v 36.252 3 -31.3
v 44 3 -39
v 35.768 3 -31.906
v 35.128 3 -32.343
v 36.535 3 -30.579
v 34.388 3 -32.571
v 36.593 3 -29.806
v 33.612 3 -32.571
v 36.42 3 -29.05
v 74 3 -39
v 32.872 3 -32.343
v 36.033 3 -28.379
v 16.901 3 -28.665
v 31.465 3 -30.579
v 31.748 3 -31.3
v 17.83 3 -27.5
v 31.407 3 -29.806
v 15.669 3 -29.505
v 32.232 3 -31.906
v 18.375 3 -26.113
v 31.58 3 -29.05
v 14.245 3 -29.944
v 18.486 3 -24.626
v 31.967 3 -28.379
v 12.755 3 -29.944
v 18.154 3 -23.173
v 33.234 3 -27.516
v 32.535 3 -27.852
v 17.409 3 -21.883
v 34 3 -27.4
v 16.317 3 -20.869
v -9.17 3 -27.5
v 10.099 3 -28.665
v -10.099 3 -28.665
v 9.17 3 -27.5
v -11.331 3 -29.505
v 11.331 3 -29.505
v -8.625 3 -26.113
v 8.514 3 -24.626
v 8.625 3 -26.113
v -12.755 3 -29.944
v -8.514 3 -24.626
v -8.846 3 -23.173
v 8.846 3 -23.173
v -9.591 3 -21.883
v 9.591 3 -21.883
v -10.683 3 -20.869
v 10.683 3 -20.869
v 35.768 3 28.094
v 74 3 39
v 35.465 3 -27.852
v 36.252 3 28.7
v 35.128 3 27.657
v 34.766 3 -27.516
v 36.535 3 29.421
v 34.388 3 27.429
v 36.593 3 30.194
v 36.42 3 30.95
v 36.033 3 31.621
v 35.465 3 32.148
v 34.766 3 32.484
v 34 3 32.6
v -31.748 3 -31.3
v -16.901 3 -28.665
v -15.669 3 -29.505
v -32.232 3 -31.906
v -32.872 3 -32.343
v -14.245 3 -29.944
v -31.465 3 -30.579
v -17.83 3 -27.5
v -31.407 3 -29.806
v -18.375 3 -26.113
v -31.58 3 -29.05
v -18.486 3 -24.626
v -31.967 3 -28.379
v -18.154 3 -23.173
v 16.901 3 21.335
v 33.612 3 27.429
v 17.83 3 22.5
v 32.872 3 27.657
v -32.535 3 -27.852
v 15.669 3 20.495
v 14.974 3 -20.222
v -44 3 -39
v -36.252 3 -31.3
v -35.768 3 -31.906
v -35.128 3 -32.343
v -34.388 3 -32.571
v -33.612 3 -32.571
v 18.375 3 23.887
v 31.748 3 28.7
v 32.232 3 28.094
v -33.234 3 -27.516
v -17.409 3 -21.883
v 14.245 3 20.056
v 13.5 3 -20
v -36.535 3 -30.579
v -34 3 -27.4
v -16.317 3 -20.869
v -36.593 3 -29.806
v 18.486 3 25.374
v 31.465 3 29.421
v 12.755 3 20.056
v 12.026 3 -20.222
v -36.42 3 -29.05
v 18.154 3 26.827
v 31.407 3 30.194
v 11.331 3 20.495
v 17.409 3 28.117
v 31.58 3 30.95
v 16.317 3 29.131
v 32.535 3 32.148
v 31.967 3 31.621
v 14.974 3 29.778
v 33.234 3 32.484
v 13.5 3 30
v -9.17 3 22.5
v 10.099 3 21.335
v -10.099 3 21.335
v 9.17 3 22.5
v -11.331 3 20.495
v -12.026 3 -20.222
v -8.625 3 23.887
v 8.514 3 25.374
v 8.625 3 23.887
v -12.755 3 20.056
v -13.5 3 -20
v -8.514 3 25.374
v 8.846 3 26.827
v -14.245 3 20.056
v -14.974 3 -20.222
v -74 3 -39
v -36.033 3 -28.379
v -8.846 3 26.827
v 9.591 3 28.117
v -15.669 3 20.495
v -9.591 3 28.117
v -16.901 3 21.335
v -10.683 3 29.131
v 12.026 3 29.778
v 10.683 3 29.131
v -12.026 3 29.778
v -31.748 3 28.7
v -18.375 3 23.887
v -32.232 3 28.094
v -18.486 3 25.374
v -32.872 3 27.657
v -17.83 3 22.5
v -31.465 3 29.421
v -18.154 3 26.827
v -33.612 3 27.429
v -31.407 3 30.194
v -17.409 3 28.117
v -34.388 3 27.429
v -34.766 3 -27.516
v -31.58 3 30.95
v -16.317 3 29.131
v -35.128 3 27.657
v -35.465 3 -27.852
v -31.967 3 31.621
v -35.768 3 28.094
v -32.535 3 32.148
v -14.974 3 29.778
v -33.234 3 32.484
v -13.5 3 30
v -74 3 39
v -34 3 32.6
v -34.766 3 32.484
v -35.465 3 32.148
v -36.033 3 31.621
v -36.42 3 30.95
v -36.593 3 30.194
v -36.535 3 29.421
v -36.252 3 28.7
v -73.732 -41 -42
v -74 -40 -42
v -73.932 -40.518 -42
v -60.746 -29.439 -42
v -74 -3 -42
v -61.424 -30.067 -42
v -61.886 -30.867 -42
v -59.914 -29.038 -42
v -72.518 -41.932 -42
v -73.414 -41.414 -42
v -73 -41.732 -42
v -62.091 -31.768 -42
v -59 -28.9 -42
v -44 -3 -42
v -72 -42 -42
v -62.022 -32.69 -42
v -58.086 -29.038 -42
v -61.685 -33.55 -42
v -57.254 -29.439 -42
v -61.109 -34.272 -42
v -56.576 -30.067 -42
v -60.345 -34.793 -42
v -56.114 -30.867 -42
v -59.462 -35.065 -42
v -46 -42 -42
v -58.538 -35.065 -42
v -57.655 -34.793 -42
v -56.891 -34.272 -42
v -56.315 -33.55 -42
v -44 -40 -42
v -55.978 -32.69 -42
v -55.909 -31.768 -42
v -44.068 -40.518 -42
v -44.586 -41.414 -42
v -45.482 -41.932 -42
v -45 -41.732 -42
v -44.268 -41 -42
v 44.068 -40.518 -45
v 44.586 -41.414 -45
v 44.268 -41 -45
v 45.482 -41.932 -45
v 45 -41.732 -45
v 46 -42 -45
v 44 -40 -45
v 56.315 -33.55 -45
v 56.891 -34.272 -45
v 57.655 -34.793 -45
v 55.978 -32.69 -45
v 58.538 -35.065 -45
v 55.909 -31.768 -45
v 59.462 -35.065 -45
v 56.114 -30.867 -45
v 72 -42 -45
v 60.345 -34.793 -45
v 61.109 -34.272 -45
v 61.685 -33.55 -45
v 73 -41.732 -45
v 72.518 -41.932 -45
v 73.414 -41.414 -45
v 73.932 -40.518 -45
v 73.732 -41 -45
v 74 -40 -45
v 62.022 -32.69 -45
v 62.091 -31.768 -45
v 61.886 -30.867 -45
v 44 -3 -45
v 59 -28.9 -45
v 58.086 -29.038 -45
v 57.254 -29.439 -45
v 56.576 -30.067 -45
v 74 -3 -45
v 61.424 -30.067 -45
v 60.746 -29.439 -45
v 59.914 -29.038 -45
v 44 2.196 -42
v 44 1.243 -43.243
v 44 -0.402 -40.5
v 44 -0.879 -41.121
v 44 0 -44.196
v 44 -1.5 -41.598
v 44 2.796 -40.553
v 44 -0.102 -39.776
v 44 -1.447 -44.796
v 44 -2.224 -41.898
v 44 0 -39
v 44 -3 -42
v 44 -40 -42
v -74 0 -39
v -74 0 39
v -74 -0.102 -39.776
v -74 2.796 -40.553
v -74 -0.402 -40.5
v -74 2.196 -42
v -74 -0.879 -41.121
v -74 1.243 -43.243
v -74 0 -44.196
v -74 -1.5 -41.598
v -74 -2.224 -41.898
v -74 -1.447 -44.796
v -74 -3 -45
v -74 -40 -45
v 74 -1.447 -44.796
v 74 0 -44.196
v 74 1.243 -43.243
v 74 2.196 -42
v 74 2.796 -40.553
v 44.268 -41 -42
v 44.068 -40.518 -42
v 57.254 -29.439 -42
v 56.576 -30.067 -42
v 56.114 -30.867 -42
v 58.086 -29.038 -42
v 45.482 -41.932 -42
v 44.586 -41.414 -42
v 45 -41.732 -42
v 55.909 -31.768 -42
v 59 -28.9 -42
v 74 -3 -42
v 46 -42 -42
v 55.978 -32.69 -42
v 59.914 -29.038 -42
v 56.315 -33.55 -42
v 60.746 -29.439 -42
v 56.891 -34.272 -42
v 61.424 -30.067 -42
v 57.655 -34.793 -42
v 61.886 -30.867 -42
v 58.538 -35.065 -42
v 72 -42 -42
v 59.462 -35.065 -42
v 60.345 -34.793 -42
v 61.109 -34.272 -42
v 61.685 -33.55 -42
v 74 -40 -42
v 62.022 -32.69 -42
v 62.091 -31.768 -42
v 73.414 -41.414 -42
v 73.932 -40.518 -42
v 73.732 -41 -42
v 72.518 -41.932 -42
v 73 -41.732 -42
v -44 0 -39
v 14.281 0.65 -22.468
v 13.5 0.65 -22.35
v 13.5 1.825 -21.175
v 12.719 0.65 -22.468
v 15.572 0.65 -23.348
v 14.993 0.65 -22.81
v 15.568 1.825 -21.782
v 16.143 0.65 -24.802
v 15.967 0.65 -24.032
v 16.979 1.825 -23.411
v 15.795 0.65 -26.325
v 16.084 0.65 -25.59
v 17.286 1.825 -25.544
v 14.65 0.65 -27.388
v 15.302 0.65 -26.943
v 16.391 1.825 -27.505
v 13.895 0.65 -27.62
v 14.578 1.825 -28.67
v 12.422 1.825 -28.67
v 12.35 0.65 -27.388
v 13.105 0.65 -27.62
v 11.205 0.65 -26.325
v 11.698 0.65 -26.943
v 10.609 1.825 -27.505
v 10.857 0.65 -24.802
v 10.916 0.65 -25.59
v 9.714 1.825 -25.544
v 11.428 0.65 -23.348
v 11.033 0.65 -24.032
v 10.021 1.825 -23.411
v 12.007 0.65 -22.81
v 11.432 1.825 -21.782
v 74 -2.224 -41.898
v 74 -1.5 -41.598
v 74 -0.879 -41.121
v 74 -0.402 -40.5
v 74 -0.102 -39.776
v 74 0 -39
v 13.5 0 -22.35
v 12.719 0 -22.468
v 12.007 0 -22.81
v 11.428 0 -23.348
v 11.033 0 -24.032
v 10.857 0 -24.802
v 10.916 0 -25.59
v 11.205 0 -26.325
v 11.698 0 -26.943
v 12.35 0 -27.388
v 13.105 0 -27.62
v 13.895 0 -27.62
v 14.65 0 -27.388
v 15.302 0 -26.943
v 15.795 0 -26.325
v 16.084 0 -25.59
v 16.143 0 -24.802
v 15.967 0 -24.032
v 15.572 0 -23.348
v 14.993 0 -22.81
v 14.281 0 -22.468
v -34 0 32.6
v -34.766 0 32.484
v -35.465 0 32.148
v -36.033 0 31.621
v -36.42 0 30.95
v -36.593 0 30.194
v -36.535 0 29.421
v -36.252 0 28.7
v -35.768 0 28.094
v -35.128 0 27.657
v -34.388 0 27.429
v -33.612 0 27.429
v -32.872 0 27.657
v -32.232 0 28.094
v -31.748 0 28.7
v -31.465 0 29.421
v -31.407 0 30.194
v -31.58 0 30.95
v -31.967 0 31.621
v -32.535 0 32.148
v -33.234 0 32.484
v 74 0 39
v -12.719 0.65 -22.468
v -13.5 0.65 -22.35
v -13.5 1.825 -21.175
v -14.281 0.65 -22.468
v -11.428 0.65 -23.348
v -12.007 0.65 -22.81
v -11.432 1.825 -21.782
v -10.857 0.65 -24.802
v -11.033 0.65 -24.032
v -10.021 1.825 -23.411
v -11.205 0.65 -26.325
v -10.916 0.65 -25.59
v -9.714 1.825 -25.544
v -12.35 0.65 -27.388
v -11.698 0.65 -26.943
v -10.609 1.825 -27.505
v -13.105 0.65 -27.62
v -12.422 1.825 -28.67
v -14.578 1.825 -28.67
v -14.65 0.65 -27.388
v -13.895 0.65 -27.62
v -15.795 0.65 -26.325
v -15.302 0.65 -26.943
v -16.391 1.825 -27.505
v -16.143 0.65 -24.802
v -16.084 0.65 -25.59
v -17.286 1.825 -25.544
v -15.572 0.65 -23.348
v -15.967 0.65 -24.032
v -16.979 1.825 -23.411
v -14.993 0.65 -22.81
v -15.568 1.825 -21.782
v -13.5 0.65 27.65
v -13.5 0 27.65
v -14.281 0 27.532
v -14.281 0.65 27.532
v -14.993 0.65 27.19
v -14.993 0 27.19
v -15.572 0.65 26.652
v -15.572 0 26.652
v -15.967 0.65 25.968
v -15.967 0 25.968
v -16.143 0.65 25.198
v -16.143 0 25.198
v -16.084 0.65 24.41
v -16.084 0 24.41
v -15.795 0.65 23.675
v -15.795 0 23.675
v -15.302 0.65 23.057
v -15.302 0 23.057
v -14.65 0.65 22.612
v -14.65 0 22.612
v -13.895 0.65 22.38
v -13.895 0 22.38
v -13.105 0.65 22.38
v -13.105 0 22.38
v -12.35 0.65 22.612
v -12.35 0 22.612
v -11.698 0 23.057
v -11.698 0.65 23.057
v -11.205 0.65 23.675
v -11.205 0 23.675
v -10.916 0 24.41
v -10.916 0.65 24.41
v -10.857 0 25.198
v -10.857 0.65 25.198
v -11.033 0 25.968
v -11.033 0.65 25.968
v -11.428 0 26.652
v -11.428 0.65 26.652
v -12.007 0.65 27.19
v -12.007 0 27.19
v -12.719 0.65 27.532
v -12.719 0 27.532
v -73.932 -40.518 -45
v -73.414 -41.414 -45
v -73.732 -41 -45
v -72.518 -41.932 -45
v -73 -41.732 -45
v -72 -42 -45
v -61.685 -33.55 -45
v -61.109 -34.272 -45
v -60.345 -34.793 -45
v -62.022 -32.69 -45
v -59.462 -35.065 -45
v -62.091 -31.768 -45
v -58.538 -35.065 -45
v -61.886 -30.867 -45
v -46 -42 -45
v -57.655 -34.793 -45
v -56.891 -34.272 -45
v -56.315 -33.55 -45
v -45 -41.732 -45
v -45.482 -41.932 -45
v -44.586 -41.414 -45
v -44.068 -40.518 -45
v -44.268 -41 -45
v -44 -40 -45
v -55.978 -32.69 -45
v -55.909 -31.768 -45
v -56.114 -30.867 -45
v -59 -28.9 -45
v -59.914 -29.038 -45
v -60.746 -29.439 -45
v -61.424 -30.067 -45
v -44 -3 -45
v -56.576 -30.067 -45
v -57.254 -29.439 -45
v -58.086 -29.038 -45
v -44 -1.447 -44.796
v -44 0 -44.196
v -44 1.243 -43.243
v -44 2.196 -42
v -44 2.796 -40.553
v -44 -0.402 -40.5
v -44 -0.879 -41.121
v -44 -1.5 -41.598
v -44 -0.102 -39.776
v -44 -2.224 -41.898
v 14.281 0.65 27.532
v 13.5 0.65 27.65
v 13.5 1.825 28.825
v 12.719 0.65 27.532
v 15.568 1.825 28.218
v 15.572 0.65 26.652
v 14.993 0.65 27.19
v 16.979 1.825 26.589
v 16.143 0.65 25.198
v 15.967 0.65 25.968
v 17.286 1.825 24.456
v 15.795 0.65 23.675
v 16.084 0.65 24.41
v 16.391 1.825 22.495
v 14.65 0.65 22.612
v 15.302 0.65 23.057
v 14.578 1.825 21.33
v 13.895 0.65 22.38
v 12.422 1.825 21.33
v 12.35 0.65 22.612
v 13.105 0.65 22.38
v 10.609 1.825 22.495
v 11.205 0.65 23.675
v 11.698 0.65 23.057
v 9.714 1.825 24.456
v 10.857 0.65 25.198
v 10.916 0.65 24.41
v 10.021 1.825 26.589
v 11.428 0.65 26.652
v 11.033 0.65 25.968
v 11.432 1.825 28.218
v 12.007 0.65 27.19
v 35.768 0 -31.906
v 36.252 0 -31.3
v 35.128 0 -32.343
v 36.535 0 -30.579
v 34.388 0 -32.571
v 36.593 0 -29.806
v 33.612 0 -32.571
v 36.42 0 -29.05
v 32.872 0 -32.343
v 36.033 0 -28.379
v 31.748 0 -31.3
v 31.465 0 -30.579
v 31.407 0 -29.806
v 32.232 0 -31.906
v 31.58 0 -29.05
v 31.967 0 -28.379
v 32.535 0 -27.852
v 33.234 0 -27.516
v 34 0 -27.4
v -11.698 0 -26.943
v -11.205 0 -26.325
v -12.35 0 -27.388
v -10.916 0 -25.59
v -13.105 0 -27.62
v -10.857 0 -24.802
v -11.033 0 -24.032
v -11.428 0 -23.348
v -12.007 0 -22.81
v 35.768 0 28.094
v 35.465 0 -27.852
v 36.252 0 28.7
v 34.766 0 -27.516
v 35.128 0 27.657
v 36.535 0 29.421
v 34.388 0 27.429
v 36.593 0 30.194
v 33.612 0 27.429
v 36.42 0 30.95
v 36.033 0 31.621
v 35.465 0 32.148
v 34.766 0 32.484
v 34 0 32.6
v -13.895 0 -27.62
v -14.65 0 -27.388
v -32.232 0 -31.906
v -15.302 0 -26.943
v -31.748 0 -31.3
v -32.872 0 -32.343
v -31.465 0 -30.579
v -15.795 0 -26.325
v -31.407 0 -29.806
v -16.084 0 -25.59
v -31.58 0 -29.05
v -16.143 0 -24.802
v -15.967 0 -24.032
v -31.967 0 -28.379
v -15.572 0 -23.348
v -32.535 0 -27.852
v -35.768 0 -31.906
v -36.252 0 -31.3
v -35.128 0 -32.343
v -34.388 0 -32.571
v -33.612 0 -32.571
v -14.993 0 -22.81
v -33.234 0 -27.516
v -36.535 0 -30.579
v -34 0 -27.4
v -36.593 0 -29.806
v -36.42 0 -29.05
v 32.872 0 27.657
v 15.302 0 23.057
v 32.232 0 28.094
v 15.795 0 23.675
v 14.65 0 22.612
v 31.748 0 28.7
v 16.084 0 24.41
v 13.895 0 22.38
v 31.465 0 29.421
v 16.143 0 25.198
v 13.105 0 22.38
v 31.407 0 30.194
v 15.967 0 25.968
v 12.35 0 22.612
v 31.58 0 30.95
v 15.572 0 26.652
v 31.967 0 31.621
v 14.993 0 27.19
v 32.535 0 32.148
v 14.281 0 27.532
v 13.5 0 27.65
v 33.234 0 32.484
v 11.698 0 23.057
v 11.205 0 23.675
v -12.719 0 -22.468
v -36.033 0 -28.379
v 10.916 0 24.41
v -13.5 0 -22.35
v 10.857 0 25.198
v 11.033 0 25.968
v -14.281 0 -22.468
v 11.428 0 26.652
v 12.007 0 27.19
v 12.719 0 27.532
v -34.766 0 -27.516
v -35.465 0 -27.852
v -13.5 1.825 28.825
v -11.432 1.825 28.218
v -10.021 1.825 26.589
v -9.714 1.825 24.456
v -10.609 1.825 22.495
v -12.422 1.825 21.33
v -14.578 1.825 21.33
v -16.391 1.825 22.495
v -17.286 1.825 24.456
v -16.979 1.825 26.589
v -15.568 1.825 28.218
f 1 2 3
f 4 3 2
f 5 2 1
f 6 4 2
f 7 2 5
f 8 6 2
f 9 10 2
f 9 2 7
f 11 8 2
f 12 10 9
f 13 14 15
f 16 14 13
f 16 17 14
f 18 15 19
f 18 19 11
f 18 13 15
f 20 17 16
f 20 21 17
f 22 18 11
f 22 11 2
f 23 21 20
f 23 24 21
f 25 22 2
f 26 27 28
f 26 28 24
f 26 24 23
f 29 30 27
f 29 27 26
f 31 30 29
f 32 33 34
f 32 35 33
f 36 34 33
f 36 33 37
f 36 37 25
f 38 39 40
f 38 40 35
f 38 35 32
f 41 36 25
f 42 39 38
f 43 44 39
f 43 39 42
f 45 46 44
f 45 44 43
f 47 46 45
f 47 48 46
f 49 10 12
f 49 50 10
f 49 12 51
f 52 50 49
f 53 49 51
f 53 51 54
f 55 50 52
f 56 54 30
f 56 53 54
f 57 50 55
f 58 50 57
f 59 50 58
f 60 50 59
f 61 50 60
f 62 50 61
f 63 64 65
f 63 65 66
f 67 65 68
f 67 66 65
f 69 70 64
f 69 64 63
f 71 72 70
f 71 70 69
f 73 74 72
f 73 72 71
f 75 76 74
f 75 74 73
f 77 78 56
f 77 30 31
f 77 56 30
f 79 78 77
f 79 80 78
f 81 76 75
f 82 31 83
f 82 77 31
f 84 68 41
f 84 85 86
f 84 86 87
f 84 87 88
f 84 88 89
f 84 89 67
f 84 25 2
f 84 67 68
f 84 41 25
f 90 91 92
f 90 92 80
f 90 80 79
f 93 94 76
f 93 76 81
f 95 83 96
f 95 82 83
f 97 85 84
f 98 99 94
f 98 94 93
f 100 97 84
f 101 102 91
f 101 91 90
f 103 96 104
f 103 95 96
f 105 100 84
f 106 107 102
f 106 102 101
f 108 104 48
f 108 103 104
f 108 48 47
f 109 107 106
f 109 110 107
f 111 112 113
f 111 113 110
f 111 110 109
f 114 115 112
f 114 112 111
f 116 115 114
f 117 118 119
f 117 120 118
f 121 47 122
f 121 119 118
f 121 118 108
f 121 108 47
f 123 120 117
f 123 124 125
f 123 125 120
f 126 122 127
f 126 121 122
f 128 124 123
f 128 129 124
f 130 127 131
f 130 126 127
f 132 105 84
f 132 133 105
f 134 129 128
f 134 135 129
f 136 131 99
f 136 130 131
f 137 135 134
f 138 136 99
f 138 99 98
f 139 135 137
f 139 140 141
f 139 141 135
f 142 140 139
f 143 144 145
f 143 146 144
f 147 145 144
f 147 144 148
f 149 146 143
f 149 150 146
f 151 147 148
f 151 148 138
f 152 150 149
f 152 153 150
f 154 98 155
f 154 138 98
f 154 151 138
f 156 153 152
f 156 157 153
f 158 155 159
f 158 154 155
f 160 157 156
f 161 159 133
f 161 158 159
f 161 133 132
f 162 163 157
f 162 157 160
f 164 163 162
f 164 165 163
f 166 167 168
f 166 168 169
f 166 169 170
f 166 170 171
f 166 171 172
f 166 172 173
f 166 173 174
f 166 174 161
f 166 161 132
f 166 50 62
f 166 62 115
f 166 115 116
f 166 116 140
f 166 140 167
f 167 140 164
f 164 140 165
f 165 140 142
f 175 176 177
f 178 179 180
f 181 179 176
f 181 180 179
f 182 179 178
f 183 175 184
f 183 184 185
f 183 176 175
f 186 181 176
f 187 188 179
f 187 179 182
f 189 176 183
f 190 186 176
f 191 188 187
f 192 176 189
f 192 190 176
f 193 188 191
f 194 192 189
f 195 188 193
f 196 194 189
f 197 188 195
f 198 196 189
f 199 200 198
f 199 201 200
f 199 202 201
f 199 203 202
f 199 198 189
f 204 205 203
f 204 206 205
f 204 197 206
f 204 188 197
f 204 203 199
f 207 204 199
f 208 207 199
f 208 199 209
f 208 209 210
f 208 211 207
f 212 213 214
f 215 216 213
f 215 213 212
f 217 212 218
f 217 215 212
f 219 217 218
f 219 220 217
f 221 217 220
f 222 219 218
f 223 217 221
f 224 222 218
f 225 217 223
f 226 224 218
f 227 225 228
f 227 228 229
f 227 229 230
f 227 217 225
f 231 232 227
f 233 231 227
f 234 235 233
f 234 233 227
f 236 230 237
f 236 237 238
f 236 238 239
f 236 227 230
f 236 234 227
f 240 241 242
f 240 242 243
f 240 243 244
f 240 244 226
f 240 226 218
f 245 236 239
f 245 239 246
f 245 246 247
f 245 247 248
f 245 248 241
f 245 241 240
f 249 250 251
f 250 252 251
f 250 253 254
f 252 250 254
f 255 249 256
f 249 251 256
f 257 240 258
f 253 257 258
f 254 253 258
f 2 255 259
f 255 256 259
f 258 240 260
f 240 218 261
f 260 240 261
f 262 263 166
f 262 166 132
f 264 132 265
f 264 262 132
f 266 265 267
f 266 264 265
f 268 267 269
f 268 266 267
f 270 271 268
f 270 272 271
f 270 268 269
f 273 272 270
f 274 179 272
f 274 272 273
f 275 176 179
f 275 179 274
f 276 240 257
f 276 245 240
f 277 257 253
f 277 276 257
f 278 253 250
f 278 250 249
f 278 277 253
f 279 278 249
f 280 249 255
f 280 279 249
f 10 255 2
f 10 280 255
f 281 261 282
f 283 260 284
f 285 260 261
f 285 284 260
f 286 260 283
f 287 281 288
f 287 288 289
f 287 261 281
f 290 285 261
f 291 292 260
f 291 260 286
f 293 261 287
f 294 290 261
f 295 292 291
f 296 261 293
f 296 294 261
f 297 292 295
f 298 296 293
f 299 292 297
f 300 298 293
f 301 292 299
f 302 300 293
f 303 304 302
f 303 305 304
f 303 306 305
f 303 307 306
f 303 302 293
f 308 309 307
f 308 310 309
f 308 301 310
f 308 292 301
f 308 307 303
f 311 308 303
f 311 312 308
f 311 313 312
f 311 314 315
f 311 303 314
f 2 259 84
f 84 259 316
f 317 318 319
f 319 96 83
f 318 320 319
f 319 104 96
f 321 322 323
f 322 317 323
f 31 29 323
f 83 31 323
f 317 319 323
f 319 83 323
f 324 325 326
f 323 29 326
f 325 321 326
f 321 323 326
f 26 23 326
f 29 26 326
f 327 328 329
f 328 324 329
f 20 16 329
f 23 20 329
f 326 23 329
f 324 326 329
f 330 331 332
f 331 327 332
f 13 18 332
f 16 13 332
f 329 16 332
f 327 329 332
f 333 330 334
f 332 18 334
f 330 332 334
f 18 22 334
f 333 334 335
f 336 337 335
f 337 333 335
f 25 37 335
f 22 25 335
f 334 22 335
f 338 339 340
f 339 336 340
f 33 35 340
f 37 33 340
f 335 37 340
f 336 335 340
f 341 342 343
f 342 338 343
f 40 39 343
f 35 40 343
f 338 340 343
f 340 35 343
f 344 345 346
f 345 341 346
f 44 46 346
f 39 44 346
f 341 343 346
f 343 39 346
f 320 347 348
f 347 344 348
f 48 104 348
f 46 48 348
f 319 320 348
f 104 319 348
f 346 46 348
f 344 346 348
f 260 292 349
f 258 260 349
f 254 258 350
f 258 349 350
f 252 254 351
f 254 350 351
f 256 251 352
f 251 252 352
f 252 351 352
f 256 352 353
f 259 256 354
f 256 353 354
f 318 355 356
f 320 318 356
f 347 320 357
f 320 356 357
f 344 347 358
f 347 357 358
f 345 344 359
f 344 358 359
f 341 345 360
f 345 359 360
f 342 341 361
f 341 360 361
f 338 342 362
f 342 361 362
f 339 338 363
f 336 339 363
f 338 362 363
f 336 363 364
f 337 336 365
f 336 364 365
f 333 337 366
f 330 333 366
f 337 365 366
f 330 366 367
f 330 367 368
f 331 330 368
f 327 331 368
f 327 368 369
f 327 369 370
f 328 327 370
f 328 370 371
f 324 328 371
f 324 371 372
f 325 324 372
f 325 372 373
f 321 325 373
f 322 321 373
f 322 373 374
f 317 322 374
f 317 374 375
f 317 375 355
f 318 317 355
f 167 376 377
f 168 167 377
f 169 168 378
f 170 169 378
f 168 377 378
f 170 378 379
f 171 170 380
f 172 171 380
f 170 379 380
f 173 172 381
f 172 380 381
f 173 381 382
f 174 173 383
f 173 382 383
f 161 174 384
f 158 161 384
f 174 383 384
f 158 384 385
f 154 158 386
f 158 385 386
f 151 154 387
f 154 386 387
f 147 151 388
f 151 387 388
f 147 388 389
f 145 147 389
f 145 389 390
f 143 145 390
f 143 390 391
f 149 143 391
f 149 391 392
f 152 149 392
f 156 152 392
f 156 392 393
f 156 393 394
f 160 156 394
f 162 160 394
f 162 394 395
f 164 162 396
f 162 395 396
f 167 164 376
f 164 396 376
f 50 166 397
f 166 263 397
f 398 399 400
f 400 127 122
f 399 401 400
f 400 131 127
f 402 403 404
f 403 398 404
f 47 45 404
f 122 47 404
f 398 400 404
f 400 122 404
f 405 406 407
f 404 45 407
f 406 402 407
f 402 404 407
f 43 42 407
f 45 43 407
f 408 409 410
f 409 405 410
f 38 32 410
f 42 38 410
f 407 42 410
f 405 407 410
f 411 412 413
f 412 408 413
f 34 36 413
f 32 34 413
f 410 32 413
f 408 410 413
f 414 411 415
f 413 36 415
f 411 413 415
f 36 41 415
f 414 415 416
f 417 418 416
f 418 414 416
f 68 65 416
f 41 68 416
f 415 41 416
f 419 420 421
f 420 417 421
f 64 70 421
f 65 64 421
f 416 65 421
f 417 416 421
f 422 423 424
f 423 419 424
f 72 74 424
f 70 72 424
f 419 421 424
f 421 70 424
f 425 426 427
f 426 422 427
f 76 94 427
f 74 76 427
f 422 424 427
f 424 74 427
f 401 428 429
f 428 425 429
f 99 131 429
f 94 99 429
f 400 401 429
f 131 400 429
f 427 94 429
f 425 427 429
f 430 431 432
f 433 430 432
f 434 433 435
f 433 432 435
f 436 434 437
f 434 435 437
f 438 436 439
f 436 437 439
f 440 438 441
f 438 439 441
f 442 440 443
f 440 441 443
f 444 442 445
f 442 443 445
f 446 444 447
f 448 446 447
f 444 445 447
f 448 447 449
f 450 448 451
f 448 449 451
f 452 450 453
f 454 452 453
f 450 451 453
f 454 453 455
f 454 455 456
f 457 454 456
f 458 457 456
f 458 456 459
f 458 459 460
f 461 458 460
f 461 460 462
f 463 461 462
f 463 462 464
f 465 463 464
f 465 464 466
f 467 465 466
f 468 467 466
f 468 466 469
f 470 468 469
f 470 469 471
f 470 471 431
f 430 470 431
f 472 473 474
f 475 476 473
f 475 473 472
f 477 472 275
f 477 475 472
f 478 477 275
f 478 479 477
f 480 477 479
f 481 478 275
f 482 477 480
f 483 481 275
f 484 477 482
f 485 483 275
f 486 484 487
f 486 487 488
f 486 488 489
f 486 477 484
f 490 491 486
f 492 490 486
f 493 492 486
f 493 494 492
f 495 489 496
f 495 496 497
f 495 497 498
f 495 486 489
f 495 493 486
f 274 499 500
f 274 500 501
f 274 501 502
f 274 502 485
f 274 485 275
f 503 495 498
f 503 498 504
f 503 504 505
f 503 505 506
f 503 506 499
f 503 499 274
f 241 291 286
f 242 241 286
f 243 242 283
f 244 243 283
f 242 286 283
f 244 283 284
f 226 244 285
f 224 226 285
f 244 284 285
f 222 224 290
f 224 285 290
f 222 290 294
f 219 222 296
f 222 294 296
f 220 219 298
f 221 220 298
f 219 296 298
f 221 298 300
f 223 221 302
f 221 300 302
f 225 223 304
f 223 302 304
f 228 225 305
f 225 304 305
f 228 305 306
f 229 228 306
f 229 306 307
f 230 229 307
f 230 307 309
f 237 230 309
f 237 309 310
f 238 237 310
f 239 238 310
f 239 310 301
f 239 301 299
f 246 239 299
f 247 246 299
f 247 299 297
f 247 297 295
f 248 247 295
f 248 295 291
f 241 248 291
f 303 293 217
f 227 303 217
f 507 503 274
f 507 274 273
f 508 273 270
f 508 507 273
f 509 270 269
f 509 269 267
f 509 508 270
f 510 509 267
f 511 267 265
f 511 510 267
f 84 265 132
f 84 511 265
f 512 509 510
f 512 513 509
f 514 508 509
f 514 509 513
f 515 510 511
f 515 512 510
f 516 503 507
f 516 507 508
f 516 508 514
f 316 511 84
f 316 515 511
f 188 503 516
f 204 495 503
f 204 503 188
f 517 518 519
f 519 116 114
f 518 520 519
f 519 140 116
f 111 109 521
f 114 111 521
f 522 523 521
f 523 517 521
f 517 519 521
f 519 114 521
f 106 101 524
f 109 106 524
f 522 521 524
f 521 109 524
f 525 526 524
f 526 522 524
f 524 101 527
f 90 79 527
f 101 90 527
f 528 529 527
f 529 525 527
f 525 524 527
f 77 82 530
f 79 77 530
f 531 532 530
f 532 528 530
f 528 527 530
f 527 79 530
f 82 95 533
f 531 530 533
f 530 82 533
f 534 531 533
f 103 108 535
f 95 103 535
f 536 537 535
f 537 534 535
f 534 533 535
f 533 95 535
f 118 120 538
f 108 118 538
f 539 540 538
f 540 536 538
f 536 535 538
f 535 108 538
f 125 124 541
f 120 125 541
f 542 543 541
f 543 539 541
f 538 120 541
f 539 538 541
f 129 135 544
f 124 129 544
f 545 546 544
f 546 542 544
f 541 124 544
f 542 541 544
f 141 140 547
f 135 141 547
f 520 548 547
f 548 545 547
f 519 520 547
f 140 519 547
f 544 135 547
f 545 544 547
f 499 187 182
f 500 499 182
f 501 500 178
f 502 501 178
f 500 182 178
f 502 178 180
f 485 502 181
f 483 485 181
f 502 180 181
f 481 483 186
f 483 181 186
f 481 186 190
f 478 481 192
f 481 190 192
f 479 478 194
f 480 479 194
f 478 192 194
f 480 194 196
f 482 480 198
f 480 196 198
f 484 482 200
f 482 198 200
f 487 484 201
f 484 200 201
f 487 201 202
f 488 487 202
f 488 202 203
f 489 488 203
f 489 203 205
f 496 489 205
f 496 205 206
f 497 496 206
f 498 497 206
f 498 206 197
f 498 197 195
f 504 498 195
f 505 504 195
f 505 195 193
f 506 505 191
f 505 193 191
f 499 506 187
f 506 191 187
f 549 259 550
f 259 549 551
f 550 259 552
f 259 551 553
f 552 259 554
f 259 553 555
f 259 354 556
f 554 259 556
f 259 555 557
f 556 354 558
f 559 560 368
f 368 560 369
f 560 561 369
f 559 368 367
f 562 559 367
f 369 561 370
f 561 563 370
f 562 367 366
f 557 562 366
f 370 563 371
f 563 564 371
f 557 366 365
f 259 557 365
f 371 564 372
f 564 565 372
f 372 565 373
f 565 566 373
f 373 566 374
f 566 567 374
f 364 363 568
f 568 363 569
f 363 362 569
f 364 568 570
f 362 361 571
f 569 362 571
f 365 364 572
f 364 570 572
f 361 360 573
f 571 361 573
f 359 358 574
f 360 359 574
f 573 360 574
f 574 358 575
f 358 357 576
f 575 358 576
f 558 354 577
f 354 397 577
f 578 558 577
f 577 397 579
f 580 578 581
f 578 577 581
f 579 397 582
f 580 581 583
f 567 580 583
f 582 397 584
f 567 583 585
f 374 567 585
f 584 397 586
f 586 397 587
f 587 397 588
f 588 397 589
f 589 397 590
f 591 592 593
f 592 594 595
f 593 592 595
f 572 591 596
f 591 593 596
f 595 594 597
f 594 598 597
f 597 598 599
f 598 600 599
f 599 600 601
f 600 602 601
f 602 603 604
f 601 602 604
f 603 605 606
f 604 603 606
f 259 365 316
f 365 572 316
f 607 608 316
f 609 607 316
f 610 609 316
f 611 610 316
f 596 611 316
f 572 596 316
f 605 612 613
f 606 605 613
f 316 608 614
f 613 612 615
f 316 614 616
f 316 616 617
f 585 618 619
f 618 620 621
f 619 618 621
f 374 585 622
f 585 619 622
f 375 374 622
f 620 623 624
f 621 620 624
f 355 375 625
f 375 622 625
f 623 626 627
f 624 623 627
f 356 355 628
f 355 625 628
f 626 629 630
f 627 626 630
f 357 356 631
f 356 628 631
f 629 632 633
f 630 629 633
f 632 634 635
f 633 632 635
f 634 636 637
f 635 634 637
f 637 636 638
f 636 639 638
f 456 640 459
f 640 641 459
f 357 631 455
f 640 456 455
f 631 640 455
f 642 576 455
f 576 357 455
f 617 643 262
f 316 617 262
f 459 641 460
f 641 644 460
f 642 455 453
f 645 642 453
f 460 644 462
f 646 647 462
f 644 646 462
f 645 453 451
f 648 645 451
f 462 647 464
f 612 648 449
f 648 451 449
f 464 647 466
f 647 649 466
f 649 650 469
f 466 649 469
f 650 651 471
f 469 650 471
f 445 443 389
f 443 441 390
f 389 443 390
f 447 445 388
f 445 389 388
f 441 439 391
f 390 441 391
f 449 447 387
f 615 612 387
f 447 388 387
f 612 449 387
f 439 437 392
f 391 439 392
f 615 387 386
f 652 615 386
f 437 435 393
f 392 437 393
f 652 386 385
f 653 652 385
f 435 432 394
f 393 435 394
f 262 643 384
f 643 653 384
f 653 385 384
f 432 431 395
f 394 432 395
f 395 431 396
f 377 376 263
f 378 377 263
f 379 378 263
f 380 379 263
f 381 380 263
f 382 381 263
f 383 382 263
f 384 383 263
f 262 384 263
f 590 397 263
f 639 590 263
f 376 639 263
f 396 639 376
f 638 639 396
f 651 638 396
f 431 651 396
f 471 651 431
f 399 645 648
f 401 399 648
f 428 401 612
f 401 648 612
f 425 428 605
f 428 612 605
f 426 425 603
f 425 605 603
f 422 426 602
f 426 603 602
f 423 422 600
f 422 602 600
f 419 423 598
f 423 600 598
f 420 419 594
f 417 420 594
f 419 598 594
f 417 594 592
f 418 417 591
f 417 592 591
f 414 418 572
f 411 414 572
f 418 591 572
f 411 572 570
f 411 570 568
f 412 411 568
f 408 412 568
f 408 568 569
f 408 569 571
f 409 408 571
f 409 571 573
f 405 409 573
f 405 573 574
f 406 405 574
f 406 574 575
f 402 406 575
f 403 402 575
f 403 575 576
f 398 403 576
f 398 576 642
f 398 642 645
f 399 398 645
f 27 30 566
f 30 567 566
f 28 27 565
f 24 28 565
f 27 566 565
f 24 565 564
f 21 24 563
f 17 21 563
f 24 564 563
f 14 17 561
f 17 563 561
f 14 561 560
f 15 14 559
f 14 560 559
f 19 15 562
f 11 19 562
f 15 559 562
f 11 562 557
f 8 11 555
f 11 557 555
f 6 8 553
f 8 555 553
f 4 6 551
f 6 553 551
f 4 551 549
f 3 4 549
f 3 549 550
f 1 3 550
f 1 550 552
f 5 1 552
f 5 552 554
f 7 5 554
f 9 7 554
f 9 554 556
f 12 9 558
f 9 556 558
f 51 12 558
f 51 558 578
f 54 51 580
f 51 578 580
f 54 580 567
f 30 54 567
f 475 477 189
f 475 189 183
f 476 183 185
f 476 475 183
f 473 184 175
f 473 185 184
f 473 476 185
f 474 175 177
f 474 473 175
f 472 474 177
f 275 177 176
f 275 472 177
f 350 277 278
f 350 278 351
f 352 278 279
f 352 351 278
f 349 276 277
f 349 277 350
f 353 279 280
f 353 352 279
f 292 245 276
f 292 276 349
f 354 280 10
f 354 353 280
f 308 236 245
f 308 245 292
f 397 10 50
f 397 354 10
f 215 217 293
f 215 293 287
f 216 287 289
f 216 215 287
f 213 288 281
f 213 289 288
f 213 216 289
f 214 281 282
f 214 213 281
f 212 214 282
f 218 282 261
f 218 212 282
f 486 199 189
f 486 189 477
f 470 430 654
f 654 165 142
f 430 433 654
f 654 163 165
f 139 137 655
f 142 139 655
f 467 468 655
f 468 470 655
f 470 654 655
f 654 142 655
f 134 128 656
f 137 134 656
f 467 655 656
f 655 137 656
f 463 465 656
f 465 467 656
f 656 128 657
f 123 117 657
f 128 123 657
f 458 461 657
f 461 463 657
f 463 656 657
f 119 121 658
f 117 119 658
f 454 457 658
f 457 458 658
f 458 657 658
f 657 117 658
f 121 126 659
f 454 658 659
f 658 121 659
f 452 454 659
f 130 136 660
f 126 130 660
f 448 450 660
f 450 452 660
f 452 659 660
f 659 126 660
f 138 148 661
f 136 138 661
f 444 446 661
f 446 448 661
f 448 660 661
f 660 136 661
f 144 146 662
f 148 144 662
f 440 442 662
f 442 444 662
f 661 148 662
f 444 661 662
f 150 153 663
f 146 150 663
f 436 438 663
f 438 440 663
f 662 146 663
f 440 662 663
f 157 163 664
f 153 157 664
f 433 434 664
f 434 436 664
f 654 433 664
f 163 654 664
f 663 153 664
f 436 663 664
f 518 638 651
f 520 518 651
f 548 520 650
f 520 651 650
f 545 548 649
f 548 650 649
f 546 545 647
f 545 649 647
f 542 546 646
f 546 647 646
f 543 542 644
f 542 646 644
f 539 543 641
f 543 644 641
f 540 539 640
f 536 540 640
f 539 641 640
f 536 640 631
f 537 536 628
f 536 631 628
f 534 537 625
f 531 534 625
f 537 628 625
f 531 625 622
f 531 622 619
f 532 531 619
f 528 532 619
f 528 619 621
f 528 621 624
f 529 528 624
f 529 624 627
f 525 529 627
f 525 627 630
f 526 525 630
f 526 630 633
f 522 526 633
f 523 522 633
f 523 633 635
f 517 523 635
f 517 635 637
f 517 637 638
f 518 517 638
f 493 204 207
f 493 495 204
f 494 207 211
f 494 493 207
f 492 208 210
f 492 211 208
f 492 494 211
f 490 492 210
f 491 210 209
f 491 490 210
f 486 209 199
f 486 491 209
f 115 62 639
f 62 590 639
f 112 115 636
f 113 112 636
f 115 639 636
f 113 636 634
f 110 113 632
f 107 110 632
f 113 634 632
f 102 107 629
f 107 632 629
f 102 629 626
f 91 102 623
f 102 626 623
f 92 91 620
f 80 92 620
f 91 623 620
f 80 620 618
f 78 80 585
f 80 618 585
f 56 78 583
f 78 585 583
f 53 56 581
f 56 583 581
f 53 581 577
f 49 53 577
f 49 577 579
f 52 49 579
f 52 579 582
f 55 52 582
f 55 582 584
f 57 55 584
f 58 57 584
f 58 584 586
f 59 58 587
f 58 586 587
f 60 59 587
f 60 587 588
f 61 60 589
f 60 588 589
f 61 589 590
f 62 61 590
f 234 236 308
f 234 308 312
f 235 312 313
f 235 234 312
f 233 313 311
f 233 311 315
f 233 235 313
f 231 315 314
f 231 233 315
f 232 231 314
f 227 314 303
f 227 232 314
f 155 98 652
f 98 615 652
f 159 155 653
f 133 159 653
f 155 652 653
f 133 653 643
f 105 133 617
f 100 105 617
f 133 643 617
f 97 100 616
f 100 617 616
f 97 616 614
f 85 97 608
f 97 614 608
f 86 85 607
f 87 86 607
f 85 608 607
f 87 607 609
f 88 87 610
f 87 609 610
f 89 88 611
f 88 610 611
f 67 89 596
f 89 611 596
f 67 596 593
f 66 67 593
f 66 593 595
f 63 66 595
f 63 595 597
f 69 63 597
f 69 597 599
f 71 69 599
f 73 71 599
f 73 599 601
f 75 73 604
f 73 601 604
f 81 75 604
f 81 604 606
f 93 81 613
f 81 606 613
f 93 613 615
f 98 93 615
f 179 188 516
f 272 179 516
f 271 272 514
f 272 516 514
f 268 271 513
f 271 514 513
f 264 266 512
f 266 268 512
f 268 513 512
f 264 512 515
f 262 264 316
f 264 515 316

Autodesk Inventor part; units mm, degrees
ref_plane "YZ Plane" through (0, 0, 0) normal (1, 0, 0) x (0, 1, 0)
ref_plane "XZ Plane" through (0, 0, 0) normal (0, 1, 0) x (-1, 0, 0)
ref_plane "XY Plane" through (0, 0, 0) normal (0, 0, 1) x (1, 0, 0)
sketch "スケッチ1" plane through (0, 0, 0) normal (0, 1, 0) x (-1, 0, 0)
  line L0 (-40, -39) -> (40, -39)
  line L1 (40, -39) -> (40, 39)
  line L2 (40, 39) -> (-40, 39)
  line L3 (-40, 39) -> (-40, -39)
  line L4 (-40, -39) -> (40, 39) construction
  line L5 (40, -39) -> (-40, 39) construction
  point P0 (0, 0)
  dimension "d0" = 80
  dimension "d1" = 78
extrude "押し出し1" add sketch "スケッチ1" along normal blind 3
sketch "スケッチ2" plane through (0, 3, 0) normal (0, 1, 0) x (1, 0, 0)
  line L0 (34, 30) -> (-34, 30)
  line L1 (-34, 30) -> (-34, -30)
  line L2 (-34, -30) -> (34, -30)
  line L3 (34, -30) -> (34, 30)
  line L4 (34, 30) -> (-34, -30) construction
  line L5 (-34, 30) -> (34, -30) construction
  point P0 (0, 0)
  dimension "d4" = 68
  dimension "d5" = 60
hole "穴1" at (-34, 3, 30) at (34, 3, 30) at (34, 3, -30) at (-34, 3, -30) direction (0, -1, 0) diameter 5.2 depth 8 tip angle 118
sketch "スケッチ3" plane through (0, 3, 0) normal (0, 1, 0) x (1, 0, 0)
  line L0 (13.5, 25) -> (-13.5, 25)
  line L1 (-13.5, 25) -> (-13.5, -25)
  line L2 (-13.5, -25) -> (13.5, -25)
  line L3 (13.5, -25) -> (13.5, 25)
  line L4 (13.5, 25) -> (-13.5, -25) construction
  line L5 (-13.5, 25) -> (13.5, -25) construction
  point P0 (0, 0)
  dimension "d13" = 27
  dimension "d14" = 50
hole "穴2" at (-13.5, 3, 25) at (13.5, 3, 25) at (13.5, 3, -25) at (-13.5, 3, -25) direction (0, -1, 0) diameter 5.3 depth 8 tip angle 118 countersink diameter 10 countersink angle 90
sketch "スケッチ5" plane through (0, 0, 0) normal (0, -1, 0) x (1, 0, 0)
  line L0 (74, 39) -> (-74, 39)
  line L1 (-74, 39) -> (-74, -39)
  line L2 (-74, -39) -> (74, -39)
  line L3 (74, -39) -> (74, 39)
  circle A0 centre (13.5, -25) radius 2.65 projected
  circle A1 centre (13.5, -25) radius 2.65 projected
  circle A2 centre (-13.5, 25) radius 2.65 projected
  circle A3 centre (13.5, 25) radius 2.65 projected
  circle A4 centre (-13.5, -25) radius 2.65 projected
  circle A5 centre (34, -30) radius 2.6 projected
  circle A6 centre (-34, 30) radius 2.6 projected
  circle A7 centre (34, 30) radius 2.6 projected
  circle A8 centre (-34, -30) radius 2.6 projected
  line L4 (-40, -39) -> (-40, 39) projected
  line L5 (40, -39) -> (-40, -39) projected
  line L6 (40, 39) -> (40, -39) projected
  line L7 (-40, 39) -> (40, 39) projected
  point P0 (0, 0)
  point P1 (-40, 39)
  dimension "d28" = 40
  dimension "d29" = 40
extrude "押し出し3" add sketch "スケッチ5" against normal up to surface (3 mm away) contours L3 L2 L6 L0 | L4 L2 L1 L0
sketch "スケッチ6" plane through (0, 0, 0) normal (0, -1, 0) x (1, 0, 0)
  circle A0 centre (13.5, -25) radius 2.65 projected
  circle A1 centre (-13.5, 25) radius 2.65 projected
  circle A2 centre (13.5, 25) radius 2.65 projected
  circle A3 centre (-13.5, -25) radius 2.65 projected
  circle A4 centre (34, -30) radius 2.6 projected
  circle A5 centre (-34, 30) radius 2.6 projected
  circle A6 centre (34, 30) radius 2.6 projected
  circle A7 centre (-34, -30) radius 2.6 projected
  line L0 (-74, -39) -> (74, -39) projected
  line L1 (74, -39) -> (74, 39) projected
  line L2 (74, 39) -> (-74, 39) projected
  line L3 (-74, 39) -> (-74, -39) projected
  line L4 (74, -39) -> (44, -39)
  line L5 (44, -39) -> (44, -42)
  line L6 (44, -42) -> (74, -42)
  line L7 (74, -42) -> (74, -39)
  line L8 (-74, 39) -> (-74, -39) projected
  line L9 (-74, -39) -> (-44, -39)
  line L10 (-44, -39) -> (-44, -42)
  line L11 (-44, -42) -> (-74, -42)
  line L12 (-74, -42) -> (-74, -39)
  line L13 (44, -42) -> (-44, -42)
  line L14 (-44, -42) -> (-44, -39)
  line L15 (-44, -39) -> (44, -39)
  line L16 (44, -39) -> (44, -42)
  point P0 (0, 0)
  dimension "d33" = 30
  dimension "d34" = 30
  dimension "d49" = 3
extrude "押し出し5" add sketch "スケッチ6" against normal up to surface (3 mm away) contours L0 L10 L11 L12 | L0 L7 L6 L5
sketch "スケッチ8" plane through (74, 0, -42) normal (0, 0, -1) x (-1, 0, 0)
  line L0 (30, 0) -> (0, 0)
  line L1 (0, 0) -> (0, -42)
  line L2 (0, -42) -> (30, -42)
  line L3 (30, -42) -> (30, 0)
edge flange "フランジ2" height 45 angle 90 thickness 3 bend radius 3 thickness toward (0, 0, -1) relief straight relief width 3 relief depth 1.5 corner gap 3 corner form 0 edges at (59, 0, -42) (-59, 0, -42) wall of the first edge with corners at (44, 0, -42) (74, 0, -42) (74, -42, -42) (44, -42, -42)
bend "曲げ2"
corner "コーナー2"
sketch "スケッチ9" plane through (-44, -42, -45) normal (0, 0, -1) x (-1, 0, 0)
  line L0 (30, 39) -> (0, 39) projected
  line L1 (0, 0) -> (0, 39) projected
  line L2 (30, 0) -> (0, 0) projected
  line L3 (30, 39) -> (30, 0) projected
  line L4 (-88, 39) -> (-118, 39) projected
  line L5 (-118, 0) -> (-118, 39) projected
  line L6 (-88, 0) -> (-118, 0) projected
  line L7 (-88, 39) -> (-88, 0) projected
  point P0 (-44, 42)
  point P1 (15, 10)
  point P2 (-103, 10)
  dimension "d62" = 10
  dimension "d63" = 15
  dimension "d64" = 15
hole "穴3" at (-59, -32, -45) at (59, -32, -45) direction (0, 0, 1) diameter 6.2 depth 3 tip angle 118
fillet "フィレット3" radius 2 4 edges at (-74, -42, -43.5) (-44, -42, -43.5) (44, -42, -43.5) (74, -42, -43.5)
equation "\"d28\" = d29"
equation "\"d70\" = Thickness"
equation "\"d38\" = Thickness"
equation "\"d52\" = BendReliefWidth"
equation "\"d53\" = BendReliefDepth"
equation "\"d54\" = MinimumRemnant"
equation "\"d55\" = TransitionRadius"
equation "\"d58\" = BendRadius"
equation "\"d59\" = CornerReliefSize"
equation "\"d60\" = GapSize"
equation "\"d61\" = JacobiRadiusSize"
equation "\"BendRadius\" = Thickness"
equation "\"BendReliefWidth\" = Thickness"
equation "\"BendReliefDepth\" = 0.5 * Thickness"
equation "\"CornerReliefSize\" = 4 * Thickness"
equation "\"MinimumRemnant\" = 2 * Thickness"
equation "\"TransitionRadius\" = BendRadius"
equation "\"JacobiRadiusSize\" = Thickness"
equation "\"GapSize\" = Thickness"
equation "\"Thickness\" = 3"
properties part number "CCM_Mount_F"
